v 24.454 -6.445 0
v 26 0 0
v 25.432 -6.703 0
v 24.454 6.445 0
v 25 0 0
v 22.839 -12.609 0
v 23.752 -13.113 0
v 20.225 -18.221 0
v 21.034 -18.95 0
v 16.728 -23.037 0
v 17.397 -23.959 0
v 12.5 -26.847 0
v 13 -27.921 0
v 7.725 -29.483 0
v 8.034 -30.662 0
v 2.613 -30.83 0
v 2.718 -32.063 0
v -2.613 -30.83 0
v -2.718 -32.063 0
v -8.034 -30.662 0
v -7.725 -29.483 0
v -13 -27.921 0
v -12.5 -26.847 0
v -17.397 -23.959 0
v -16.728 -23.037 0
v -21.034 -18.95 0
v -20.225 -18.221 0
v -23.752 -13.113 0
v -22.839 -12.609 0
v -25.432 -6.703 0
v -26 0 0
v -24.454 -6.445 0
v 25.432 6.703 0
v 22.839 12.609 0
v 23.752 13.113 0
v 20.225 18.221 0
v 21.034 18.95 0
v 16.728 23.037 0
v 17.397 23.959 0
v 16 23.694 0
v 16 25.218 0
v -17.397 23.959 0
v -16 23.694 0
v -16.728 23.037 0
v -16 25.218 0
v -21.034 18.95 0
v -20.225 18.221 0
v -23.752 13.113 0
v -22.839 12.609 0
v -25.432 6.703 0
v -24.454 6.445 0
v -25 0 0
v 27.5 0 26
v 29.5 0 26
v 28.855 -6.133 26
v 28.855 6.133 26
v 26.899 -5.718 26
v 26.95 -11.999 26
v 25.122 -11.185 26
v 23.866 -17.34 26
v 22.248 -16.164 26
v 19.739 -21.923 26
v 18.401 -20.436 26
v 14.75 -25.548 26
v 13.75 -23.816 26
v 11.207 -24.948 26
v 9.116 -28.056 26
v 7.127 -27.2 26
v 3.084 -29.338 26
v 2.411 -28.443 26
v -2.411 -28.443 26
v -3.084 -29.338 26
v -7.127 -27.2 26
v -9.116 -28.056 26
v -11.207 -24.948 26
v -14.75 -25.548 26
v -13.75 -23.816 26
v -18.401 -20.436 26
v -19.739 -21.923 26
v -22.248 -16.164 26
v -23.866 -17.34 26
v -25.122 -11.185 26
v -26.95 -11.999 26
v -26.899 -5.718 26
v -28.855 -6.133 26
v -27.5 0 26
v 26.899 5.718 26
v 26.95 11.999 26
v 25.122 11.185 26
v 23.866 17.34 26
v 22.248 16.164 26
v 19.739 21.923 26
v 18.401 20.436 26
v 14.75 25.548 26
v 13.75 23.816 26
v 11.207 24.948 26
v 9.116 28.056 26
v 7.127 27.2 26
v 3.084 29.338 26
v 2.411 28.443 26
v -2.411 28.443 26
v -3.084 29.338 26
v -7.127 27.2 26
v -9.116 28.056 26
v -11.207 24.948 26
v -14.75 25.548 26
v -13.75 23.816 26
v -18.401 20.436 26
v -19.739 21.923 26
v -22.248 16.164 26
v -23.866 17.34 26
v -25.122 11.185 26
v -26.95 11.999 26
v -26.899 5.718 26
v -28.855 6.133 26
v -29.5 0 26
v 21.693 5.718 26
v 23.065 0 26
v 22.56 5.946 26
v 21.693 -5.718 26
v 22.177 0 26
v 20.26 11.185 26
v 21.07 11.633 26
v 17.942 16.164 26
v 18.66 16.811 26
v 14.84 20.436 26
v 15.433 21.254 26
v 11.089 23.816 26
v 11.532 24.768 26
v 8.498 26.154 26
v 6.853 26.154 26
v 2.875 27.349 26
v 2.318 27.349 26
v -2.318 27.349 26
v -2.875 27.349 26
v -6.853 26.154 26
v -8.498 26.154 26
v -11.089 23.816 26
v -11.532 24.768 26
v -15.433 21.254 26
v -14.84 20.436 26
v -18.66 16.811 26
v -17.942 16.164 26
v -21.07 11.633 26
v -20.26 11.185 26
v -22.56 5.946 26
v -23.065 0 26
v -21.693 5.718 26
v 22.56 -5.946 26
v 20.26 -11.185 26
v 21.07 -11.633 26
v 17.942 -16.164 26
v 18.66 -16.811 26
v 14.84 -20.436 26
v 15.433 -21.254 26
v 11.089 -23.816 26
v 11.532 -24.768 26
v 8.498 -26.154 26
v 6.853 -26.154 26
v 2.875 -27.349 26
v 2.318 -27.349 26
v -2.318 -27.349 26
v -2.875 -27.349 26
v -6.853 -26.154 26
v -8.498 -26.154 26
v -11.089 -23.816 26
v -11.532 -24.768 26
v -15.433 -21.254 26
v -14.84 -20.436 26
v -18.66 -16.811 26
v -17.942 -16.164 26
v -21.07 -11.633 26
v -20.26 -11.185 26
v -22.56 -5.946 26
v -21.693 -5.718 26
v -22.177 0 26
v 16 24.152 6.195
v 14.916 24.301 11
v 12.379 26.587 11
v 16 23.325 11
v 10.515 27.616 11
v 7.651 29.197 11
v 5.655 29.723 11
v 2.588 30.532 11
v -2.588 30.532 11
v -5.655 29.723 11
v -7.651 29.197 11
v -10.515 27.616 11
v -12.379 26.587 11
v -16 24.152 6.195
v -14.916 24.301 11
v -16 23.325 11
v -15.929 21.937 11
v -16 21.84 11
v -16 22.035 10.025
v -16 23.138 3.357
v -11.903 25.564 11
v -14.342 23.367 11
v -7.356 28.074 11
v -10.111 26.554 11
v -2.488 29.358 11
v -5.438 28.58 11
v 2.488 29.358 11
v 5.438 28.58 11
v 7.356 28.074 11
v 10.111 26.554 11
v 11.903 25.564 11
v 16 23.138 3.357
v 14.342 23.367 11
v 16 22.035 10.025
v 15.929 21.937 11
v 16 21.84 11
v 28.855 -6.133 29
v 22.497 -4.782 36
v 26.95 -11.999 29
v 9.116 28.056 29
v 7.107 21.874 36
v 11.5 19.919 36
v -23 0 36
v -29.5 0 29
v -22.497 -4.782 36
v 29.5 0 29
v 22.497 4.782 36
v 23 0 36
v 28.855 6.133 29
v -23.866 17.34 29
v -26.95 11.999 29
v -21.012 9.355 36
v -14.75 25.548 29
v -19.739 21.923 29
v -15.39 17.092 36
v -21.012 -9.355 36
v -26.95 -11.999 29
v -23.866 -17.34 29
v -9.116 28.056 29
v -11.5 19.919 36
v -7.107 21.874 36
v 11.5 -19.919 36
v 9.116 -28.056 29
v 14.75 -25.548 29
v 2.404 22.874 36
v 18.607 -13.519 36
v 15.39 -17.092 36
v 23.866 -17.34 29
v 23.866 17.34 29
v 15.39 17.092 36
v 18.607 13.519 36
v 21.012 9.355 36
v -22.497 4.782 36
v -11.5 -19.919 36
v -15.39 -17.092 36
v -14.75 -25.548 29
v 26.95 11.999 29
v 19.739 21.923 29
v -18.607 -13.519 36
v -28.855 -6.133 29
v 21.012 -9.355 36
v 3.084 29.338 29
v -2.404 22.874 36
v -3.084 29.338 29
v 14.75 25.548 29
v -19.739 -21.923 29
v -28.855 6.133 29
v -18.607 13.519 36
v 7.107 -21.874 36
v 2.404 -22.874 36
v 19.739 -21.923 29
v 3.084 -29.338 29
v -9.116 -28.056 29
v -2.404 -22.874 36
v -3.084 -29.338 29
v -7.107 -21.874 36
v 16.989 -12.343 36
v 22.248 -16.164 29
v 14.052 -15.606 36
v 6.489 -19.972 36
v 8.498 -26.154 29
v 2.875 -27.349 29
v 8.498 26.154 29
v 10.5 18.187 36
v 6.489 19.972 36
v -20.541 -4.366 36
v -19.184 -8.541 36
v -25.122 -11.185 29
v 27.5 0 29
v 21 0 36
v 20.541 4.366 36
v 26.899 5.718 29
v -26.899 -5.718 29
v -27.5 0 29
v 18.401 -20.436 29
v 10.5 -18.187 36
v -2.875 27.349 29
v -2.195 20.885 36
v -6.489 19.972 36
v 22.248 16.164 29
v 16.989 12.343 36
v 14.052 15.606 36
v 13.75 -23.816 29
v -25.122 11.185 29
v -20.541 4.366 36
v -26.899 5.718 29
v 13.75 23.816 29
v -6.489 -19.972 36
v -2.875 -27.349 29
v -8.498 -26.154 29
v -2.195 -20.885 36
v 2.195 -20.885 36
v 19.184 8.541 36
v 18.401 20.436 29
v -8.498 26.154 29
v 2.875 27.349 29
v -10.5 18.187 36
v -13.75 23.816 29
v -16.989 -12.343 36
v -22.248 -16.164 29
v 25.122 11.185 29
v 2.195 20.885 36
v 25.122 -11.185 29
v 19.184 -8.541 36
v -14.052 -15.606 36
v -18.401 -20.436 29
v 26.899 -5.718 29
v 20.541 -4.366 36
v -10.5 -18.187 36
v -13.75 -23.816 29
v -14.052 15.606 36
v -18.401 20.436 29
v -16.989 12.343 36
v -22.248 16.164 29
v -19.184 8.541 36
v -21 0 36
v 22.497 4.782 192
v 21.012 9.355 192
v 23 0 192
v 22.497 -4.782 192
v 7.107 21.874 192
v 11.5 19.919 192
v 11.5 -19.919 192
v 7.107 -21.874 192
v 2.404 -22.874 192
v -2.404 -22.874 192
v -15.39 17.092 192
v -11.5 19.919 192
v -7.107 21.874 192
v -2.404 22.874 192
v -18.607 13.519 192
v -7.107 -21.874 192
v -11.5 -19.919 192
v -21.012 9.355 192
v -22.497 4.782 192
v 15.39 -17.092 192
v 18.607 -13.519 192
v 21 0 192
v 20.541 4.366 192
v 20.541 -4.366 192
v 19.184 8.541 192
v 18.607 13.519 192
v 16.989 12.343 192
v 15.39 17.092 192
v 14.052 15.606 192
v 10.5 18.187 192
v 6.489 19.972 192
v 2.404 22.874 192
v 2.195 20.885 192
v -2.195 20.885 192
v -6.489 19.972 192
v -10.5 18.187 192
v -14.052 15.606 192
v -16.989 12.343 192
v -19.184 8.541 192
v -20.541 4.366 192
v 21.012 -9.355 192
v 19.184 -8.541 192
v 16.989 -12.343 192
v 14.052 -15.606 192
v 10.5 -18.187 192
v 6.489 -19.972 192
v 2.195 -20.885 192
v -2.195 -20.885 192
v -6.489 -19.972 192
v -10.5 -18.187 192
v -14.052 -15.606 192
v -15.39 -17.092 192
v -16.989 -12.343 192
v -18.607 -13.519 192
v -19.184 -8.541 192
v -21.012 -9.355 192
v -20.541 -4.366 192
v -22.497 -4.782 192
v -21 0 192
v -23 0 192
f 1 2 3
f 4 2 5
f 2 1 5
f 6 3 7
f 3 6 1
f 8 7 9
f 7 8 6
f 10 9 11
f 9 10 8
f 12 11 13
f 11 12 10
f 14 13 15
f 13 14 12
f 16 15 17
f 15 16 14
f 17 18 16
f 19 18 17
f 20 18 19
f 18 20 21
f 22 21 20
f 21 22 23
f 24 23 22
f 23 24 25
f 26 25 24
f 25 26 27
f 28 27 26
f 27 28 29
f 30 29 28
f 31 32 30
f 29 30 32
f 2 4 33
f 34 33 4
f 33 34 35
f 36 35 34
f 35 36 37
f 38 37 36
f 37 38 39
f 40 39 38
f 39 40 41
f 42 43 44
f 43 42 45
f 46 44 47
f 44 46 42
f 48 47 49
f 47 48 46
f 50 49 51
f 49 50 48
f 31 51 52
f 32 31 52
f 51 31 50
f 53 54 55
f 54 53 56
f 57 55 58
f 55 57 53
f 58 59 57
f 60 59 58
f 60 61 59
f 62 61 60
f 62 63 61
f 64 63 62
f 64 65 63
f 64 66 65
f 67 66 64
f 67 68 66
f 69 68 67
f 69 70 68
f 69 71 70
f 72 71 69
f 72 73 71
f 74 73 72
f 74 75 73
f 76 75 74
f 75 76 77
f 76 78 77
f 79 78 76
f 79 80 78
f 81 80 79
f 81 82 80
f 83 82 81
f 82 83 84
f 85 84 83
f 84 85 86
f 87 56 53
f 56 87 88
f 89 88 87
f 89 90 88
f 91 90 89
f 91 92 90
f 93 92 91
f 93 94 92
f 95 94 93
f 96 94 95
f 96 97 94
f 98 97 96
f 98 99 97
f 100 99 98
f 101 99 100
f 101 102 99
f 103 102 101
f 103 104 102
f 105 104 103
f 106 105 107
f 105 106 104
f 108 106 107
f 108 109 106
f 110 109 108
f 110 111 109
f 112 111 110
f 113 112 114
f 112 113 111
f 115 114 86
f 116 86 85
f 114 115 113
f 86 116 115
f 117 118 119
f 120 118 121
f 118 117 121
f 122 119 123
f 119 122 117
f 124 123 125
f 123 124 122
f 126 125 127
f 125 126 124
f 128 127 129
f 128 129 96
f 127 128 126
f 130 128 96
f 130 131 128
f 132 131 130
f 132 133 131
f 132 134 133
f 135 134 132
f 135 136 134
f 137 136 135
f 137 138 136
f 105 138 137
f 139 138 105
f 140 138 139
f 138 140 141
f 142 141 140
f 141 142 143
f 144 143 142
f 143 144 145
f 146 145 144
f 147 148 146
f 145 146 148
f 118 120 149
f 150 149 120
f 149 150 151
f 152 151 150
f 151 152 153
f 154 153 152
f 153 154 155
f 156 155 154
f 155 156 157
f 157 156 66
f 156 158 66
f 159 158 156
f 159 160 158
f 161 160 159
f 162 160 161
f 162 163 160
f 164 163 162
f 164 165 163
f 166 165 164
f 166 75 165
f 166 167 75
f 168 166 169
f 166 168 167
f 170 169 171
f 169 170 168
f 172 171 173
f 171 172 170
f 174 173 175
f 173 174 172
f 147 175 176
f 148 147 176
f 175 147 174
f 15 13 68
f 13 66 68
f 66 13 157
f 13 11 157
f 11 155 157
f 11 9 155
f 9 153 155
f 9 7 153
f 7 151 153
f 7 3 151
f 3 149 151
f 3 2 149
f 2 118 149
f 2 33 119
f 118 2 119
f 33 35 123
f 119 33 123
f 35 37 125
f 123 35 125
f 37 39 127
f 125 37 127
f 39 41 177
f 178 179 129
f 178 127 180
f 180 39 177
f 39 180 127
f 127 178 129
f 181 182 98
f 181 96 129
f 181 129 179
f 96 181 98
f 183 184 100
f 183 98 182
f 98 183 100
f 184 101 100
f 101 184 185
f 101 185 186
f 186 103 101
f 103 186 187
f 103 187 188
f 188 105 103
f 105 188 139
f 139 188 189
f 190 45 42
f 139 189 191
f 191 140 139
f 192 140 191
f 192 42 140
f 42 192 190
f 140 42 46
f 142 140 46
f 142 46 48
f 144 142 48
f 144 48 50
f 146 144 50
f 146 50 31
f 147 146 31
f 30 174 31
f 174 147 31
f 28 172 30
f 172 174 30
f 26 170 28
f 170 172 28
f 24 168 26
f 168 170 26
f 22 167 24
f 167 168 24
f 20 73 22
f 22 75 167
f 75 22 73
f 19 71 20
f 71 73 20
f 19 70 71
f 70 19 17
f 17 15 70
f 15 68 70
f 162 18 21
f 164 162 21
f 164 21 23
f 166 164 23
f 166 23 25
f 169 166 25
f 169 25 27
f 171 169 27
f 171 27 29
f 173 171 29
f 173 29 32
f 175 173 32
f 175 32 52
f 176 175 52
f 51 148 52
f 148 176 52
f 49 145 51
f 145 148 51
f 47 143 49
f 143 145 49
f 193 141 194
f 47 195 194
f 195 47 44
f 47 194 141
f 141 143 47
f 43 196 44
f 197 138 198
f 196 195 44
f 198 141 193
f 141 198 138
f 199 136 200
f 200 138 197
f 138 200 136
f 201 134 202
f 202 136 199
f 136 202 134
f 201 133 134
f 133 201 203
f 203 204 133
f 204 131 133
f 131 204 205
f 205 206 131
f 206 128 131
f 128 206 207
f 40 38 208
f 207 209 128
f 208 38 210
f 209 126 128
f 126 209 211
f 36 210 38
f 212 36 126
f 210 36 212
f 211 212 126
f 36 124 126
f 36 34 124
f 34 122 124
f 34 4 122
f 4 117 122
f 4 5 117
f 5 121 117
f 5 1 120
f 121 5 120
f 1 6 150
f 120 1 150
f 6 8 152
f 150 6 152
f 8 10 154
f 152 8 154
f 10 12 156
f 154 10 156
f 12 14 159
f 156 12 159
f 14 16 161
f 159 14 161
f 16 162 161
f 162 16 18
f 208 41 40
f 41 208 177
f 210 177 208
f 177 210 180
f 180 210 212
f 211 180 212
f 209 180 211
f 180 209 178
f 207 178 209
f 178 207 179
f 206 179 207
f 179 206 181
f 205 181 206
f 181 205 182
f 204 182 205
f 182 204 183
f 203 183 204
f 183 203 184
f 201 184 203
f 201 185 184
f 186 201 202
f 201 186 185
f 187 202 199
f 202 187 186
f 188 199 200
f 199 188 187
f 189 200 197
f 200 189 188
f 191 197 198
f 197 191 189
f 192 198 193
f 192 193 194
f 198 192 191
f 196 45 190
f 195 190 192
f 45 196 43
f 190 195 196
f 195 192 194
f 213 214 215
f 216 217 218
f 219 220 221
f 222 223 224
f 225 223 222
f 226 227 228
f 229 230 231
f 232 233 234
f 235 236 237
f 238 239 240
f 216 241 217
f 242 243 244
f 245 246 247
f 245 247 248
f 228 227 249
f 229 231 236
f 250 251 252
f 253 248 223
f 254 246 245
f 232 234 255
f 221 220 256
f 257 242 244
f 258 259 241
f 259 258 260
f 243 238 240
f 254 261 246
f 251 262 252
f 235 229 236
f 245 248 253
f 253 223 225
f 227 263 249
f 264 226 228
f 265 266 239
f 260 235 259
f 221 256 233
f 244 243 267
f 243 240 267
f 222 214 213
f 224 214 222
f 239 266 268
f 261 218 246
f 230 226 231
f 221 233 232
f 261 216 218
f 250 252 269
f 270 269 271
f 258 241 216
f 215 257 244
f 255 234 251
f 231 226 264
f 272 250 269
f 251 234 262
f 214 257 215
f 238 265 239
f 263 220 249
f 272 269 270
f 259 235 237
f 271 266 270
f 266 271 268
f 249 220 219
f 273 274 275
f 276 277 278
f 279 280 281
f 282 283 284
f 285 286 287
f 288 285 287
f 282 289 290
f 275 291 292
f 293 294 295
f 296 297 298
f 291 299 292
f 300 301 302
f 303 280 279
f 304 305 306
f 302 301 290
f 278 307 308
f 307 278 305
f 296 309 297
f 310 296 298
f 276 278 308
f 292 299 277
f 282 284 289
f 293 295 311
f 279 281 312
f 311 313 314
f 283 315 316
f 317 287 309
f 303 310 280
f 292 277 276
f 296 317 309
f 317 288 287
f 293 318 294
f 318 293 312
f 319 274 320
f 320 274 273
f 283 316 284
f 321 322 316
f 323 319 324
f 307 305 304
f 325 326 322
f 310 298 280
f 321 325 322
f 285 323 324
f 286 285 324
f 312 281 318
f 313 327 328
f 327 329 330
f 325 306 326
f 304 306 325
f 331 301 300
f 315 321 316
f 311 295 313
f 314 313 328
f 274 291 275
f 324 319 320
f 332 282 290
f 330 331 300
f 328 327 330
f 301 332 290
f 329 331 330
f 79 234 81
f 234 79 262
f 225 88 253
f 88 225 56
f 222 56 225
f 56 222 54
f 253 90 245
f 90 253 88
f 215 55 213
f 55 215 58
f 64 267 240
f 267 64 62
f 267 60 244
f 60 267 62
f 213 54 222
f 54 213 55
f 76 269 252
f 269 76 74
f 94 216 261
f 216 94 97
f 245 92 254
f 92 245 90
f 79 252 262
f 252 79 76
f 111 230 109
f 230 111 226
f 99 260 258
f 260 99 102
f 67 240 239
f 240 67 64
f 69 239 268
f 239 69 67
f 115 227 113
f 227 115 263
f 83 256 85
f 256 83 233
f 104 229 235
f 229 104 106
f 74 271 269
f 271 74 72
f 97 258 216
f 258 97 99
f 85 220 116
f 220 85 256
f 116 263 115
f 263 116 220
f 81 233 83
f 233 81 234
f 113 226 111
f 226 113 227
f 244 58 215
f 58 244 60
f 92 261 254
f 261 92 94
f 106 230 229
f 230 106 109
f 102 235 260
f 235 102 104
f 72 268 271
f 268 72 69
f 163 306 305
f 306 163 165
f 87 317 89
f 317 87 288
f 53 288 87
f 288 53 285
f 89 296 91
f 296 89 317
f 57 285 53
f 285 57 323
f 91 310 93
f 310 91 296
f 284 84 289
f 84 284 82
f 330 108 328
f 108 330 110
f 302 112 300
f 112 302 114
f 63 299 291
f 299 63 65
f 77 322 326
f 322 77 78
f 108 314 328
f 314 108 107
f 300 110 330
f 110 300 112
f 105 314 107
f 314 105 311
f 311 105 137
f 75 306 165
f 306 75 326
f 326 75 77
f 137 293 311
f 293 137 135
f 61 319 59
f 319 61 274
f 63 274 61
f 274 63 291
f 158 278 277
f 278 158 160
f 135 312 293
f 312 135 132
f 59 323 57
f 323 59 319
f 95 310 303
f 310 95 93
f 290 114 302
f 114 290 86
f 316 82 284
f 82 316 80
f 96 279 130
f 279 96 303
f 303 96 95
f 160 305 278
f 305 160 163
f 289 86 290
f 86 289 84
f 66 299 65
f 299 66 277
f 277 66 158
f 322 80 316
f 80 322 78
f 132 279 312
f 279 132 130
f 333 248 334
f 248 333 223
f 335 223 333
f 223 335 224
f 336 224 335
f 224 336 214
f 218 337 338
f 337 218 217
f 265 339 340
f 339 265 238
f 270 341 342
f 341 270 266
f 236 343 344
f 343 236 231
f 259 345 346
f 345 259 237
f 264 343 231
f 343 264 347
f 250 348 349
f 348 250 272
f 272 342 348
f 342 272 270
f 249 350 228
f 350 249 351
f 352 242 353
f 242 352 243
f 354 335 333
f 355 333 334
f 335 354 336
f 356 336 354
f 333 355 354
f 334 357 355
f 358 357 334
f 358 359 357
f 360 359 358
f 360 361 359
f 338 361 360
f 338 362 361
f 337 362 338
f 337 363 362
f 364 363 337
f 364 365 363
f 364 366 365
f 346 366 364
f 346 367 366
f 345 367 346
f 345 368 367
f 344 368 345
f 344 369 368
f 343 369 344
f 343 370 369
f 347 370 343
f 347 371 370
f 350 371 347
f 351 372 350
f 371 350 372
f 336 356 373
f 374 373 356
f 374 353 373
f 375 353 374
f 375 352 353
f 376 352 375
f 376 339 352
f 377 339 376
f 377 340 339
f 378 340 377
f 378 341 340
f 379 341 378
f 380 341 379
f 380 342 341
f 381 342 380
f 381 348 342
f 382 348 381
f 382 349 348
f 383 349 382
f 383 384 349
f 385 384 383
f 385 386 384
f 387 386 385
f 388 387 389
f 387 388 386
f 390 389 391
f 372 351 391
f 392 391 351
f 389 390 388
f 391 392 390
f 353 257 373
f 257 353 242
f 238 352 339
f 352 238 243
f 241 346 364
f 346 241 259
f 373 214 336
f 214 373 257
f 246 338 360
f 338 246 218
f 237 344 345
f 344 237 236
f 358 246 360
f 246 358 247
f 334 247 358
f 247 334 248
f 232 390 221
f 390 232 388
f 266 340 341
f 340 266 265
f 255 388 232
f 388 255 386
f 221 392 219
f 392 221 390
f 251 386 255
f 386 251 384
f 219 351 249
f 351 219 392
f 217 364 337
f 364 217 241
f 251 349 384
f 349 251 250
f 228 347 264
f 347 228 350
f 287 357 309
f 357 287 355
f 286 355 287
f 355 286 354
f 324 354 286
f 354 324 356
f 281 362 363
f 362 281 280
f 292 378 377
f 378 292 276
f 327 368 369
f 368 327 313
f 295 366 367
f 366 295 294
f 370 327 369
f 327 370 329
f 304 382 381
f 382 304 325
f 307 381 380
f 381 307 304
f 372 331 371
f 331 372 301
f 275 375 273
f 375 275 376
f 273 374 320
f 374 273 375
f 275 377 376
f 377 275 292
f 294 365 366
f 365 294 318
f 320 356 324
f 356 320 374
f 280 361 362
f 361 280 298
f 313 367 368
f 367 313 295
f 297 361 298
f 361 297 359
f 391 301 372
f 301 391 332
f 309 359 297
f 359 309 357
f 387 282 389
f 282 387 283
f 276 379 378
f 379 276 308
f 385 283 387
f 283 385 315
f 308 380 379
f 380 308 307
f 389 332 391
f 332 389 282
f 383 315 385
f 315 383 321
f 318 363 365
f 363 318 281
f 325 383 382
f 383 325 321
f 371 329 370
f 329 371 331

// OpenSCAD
flip = false; // Print upside down to avoid using supports.
wall_thickness = 2;

base_bottom_width = 50;
base_bottom_depth = 62;
base_top_width = 42;
base_top_depth = 55;
base_height = 26;

power_notch_width = 32;
power_notch_depth = 20;
power_notch_height = 11;
power_notch_offset = 10;

base_tube_transition_height = 10;

tube_diameter = 42;
tube_height = 166;

spire_diameter = 16;
spire_height = 40;

// Calculated
base_taper = get_minimal_taper(base_bottom_depth, base_bottom_width, base_top_depth, base_top_width);
base_max_bottom_diameter = base_bottom_width > base_bottom_depth ? base_bottom_width : base_bottom_depth;
base_max_top_diameter = base_max_bottom_diameter * base_taper;

color("yellow", 0.8) difference() {
  basic_base(base_bottom_depth, base_bottom_width, base_height, wall_thickness, base_taper);
  translate([0, base_bottom_depth/2-power_notch_offset, 0]) power_notch(power_notch_width, power_notch_depth, power_notch_height);
}

translate([0, 0, base_height]) base_tube_transition(base_max_top_diameter, tube_diameter, base_tube_transition_height, wall_thickness);

translate([0, 0, base_height+base_tube_transition_height]) tube(tube_diameter, tube_height - base_tube_transition_height, wall_thickness);

module tube(diameter, height, wall_thickness) {
  difference() {
    cylinder(h=height, r=diameter/2+wall_thickness);
    cylinder(h=height, r=diameter/2);
  }
}

module base_tube_transition(bottom_diameter, top_diameter, height, wall_thickness) {
  buffer = 3;
  translate([0, 0, buffer]) difference() {
    cylinder(h=height-buffer, r1=bottom_diameter/2+wall_thickness, r2=top_diameter/2+wall_thickness);
    cylinder(h=height-buffer, r1=bottom_diameter/2, r2=top_diameter/2);
  }
  difference() {
    cylinder(h=buffer, r=bottom_diameter/2+wall_thickness);
    cylinder(h=buffer, r=bottom_diameter/2);
  }
}

module power_notch(width, depth, height) {
  translate([0, depth/2, height/2]) cube([width, depth, height], center=true);
}

// Use the lesser taper to ensure clearance (closest to 1.0)
function get_minimal_taper(bottom_depth, bottom_width, top_depth, top_width) = (top_width / bottom_width) > (top_depth / bottom_depth) ? top_width / bottom_width : top_depth / bottom_depth;

module basic_base(depth, width, height, wall_thickness, taper) {
  linear_extrude(height, scale=taper) difference() {
    scale([1,depth/width,1]) circle(d=width+wall_thickness);
    scale([1,depth/width,1]) circle(d=width);
  }
}

//cap_thickness=3;
//cap_taper=0.8;
//wall_thickness=3;
//tube_height=260;
//air_hole_width=3;
//tube_taper=0.9;
//power_notch_width=30;
//power_notch_depth=20;
//power_notch_height=10;
//max_width=100;
//
//base_taper=base_top_width/base_width;
//
//// Force Goldfeather needs to be enabled in preferences for a preview to work okay. Rendering works fine regardless.
//tube_base();
//
//* translate([0, 0, flip ? base_height+tube_height+cap_thickness : 0]) rotate([flip ? 180 : 0,0,0]) union() {
//  tube_base();
//  translate([0,0,base_height]) main_tube();
//  translate([0, 0, base_height+tube_height]) cap();
//}
//
//module main_oval() {
//  scale([1,base_depth/base_width,1]) circle(d=base_width+wall_thickness);
//}
//
//module main_oval_hollow() {
//  difference() {
//    main_oval();
//    scale([1,base_depth/base_width,1]) circle(d=base_width);
//  }
//}
//
//module power_notch() {
//  cube([power_notch_width, power_notch_depth, power_notch_height]);
//}
//
//module tube_base() {
//  difference() {
//    linear_extrude(height=base_height, scale=base_taper) main_oval_hollow();
//    translate([power_notch_width/-2, base_depth/2-power_notch_depth/2, 0]) power_notch();
//  }
//}
//
//module main_tube() {
//  difference() {
//    linear_extrude(height=tube_height, scale=tube_taper) scale([base_taper,base_taper,1]) main_oval_hollow();
//    main_tube_air_holes();
//  }
//}
//
//module main_tube_air_holes() {
//  dupe_count=floor(tube_height/air_hole_width/2)-1;
//  for(j=[1:dupe_count]) {
//    hole_rotate = j/2==floor(j/2) ? 0 : 15;
//    translate([0,0,j*air_hole_width*2]) rotate([0,0,hole_rotate])
//    for(i=[0:30:180]) {
//      rotate([90,0,i])
//        translate([0,0,max_width/-2])
//          linear_extrude(max_width)
//            circle(d=air_hole_width);
//    }
//  }
//}
//
//module cap() {
//  linear_extrude(height=cap_thickness, scale=cap_taper)
//    scale([base_taper*tube_taper, base_taper*tube_taper, 1]) main_oval();
//}
